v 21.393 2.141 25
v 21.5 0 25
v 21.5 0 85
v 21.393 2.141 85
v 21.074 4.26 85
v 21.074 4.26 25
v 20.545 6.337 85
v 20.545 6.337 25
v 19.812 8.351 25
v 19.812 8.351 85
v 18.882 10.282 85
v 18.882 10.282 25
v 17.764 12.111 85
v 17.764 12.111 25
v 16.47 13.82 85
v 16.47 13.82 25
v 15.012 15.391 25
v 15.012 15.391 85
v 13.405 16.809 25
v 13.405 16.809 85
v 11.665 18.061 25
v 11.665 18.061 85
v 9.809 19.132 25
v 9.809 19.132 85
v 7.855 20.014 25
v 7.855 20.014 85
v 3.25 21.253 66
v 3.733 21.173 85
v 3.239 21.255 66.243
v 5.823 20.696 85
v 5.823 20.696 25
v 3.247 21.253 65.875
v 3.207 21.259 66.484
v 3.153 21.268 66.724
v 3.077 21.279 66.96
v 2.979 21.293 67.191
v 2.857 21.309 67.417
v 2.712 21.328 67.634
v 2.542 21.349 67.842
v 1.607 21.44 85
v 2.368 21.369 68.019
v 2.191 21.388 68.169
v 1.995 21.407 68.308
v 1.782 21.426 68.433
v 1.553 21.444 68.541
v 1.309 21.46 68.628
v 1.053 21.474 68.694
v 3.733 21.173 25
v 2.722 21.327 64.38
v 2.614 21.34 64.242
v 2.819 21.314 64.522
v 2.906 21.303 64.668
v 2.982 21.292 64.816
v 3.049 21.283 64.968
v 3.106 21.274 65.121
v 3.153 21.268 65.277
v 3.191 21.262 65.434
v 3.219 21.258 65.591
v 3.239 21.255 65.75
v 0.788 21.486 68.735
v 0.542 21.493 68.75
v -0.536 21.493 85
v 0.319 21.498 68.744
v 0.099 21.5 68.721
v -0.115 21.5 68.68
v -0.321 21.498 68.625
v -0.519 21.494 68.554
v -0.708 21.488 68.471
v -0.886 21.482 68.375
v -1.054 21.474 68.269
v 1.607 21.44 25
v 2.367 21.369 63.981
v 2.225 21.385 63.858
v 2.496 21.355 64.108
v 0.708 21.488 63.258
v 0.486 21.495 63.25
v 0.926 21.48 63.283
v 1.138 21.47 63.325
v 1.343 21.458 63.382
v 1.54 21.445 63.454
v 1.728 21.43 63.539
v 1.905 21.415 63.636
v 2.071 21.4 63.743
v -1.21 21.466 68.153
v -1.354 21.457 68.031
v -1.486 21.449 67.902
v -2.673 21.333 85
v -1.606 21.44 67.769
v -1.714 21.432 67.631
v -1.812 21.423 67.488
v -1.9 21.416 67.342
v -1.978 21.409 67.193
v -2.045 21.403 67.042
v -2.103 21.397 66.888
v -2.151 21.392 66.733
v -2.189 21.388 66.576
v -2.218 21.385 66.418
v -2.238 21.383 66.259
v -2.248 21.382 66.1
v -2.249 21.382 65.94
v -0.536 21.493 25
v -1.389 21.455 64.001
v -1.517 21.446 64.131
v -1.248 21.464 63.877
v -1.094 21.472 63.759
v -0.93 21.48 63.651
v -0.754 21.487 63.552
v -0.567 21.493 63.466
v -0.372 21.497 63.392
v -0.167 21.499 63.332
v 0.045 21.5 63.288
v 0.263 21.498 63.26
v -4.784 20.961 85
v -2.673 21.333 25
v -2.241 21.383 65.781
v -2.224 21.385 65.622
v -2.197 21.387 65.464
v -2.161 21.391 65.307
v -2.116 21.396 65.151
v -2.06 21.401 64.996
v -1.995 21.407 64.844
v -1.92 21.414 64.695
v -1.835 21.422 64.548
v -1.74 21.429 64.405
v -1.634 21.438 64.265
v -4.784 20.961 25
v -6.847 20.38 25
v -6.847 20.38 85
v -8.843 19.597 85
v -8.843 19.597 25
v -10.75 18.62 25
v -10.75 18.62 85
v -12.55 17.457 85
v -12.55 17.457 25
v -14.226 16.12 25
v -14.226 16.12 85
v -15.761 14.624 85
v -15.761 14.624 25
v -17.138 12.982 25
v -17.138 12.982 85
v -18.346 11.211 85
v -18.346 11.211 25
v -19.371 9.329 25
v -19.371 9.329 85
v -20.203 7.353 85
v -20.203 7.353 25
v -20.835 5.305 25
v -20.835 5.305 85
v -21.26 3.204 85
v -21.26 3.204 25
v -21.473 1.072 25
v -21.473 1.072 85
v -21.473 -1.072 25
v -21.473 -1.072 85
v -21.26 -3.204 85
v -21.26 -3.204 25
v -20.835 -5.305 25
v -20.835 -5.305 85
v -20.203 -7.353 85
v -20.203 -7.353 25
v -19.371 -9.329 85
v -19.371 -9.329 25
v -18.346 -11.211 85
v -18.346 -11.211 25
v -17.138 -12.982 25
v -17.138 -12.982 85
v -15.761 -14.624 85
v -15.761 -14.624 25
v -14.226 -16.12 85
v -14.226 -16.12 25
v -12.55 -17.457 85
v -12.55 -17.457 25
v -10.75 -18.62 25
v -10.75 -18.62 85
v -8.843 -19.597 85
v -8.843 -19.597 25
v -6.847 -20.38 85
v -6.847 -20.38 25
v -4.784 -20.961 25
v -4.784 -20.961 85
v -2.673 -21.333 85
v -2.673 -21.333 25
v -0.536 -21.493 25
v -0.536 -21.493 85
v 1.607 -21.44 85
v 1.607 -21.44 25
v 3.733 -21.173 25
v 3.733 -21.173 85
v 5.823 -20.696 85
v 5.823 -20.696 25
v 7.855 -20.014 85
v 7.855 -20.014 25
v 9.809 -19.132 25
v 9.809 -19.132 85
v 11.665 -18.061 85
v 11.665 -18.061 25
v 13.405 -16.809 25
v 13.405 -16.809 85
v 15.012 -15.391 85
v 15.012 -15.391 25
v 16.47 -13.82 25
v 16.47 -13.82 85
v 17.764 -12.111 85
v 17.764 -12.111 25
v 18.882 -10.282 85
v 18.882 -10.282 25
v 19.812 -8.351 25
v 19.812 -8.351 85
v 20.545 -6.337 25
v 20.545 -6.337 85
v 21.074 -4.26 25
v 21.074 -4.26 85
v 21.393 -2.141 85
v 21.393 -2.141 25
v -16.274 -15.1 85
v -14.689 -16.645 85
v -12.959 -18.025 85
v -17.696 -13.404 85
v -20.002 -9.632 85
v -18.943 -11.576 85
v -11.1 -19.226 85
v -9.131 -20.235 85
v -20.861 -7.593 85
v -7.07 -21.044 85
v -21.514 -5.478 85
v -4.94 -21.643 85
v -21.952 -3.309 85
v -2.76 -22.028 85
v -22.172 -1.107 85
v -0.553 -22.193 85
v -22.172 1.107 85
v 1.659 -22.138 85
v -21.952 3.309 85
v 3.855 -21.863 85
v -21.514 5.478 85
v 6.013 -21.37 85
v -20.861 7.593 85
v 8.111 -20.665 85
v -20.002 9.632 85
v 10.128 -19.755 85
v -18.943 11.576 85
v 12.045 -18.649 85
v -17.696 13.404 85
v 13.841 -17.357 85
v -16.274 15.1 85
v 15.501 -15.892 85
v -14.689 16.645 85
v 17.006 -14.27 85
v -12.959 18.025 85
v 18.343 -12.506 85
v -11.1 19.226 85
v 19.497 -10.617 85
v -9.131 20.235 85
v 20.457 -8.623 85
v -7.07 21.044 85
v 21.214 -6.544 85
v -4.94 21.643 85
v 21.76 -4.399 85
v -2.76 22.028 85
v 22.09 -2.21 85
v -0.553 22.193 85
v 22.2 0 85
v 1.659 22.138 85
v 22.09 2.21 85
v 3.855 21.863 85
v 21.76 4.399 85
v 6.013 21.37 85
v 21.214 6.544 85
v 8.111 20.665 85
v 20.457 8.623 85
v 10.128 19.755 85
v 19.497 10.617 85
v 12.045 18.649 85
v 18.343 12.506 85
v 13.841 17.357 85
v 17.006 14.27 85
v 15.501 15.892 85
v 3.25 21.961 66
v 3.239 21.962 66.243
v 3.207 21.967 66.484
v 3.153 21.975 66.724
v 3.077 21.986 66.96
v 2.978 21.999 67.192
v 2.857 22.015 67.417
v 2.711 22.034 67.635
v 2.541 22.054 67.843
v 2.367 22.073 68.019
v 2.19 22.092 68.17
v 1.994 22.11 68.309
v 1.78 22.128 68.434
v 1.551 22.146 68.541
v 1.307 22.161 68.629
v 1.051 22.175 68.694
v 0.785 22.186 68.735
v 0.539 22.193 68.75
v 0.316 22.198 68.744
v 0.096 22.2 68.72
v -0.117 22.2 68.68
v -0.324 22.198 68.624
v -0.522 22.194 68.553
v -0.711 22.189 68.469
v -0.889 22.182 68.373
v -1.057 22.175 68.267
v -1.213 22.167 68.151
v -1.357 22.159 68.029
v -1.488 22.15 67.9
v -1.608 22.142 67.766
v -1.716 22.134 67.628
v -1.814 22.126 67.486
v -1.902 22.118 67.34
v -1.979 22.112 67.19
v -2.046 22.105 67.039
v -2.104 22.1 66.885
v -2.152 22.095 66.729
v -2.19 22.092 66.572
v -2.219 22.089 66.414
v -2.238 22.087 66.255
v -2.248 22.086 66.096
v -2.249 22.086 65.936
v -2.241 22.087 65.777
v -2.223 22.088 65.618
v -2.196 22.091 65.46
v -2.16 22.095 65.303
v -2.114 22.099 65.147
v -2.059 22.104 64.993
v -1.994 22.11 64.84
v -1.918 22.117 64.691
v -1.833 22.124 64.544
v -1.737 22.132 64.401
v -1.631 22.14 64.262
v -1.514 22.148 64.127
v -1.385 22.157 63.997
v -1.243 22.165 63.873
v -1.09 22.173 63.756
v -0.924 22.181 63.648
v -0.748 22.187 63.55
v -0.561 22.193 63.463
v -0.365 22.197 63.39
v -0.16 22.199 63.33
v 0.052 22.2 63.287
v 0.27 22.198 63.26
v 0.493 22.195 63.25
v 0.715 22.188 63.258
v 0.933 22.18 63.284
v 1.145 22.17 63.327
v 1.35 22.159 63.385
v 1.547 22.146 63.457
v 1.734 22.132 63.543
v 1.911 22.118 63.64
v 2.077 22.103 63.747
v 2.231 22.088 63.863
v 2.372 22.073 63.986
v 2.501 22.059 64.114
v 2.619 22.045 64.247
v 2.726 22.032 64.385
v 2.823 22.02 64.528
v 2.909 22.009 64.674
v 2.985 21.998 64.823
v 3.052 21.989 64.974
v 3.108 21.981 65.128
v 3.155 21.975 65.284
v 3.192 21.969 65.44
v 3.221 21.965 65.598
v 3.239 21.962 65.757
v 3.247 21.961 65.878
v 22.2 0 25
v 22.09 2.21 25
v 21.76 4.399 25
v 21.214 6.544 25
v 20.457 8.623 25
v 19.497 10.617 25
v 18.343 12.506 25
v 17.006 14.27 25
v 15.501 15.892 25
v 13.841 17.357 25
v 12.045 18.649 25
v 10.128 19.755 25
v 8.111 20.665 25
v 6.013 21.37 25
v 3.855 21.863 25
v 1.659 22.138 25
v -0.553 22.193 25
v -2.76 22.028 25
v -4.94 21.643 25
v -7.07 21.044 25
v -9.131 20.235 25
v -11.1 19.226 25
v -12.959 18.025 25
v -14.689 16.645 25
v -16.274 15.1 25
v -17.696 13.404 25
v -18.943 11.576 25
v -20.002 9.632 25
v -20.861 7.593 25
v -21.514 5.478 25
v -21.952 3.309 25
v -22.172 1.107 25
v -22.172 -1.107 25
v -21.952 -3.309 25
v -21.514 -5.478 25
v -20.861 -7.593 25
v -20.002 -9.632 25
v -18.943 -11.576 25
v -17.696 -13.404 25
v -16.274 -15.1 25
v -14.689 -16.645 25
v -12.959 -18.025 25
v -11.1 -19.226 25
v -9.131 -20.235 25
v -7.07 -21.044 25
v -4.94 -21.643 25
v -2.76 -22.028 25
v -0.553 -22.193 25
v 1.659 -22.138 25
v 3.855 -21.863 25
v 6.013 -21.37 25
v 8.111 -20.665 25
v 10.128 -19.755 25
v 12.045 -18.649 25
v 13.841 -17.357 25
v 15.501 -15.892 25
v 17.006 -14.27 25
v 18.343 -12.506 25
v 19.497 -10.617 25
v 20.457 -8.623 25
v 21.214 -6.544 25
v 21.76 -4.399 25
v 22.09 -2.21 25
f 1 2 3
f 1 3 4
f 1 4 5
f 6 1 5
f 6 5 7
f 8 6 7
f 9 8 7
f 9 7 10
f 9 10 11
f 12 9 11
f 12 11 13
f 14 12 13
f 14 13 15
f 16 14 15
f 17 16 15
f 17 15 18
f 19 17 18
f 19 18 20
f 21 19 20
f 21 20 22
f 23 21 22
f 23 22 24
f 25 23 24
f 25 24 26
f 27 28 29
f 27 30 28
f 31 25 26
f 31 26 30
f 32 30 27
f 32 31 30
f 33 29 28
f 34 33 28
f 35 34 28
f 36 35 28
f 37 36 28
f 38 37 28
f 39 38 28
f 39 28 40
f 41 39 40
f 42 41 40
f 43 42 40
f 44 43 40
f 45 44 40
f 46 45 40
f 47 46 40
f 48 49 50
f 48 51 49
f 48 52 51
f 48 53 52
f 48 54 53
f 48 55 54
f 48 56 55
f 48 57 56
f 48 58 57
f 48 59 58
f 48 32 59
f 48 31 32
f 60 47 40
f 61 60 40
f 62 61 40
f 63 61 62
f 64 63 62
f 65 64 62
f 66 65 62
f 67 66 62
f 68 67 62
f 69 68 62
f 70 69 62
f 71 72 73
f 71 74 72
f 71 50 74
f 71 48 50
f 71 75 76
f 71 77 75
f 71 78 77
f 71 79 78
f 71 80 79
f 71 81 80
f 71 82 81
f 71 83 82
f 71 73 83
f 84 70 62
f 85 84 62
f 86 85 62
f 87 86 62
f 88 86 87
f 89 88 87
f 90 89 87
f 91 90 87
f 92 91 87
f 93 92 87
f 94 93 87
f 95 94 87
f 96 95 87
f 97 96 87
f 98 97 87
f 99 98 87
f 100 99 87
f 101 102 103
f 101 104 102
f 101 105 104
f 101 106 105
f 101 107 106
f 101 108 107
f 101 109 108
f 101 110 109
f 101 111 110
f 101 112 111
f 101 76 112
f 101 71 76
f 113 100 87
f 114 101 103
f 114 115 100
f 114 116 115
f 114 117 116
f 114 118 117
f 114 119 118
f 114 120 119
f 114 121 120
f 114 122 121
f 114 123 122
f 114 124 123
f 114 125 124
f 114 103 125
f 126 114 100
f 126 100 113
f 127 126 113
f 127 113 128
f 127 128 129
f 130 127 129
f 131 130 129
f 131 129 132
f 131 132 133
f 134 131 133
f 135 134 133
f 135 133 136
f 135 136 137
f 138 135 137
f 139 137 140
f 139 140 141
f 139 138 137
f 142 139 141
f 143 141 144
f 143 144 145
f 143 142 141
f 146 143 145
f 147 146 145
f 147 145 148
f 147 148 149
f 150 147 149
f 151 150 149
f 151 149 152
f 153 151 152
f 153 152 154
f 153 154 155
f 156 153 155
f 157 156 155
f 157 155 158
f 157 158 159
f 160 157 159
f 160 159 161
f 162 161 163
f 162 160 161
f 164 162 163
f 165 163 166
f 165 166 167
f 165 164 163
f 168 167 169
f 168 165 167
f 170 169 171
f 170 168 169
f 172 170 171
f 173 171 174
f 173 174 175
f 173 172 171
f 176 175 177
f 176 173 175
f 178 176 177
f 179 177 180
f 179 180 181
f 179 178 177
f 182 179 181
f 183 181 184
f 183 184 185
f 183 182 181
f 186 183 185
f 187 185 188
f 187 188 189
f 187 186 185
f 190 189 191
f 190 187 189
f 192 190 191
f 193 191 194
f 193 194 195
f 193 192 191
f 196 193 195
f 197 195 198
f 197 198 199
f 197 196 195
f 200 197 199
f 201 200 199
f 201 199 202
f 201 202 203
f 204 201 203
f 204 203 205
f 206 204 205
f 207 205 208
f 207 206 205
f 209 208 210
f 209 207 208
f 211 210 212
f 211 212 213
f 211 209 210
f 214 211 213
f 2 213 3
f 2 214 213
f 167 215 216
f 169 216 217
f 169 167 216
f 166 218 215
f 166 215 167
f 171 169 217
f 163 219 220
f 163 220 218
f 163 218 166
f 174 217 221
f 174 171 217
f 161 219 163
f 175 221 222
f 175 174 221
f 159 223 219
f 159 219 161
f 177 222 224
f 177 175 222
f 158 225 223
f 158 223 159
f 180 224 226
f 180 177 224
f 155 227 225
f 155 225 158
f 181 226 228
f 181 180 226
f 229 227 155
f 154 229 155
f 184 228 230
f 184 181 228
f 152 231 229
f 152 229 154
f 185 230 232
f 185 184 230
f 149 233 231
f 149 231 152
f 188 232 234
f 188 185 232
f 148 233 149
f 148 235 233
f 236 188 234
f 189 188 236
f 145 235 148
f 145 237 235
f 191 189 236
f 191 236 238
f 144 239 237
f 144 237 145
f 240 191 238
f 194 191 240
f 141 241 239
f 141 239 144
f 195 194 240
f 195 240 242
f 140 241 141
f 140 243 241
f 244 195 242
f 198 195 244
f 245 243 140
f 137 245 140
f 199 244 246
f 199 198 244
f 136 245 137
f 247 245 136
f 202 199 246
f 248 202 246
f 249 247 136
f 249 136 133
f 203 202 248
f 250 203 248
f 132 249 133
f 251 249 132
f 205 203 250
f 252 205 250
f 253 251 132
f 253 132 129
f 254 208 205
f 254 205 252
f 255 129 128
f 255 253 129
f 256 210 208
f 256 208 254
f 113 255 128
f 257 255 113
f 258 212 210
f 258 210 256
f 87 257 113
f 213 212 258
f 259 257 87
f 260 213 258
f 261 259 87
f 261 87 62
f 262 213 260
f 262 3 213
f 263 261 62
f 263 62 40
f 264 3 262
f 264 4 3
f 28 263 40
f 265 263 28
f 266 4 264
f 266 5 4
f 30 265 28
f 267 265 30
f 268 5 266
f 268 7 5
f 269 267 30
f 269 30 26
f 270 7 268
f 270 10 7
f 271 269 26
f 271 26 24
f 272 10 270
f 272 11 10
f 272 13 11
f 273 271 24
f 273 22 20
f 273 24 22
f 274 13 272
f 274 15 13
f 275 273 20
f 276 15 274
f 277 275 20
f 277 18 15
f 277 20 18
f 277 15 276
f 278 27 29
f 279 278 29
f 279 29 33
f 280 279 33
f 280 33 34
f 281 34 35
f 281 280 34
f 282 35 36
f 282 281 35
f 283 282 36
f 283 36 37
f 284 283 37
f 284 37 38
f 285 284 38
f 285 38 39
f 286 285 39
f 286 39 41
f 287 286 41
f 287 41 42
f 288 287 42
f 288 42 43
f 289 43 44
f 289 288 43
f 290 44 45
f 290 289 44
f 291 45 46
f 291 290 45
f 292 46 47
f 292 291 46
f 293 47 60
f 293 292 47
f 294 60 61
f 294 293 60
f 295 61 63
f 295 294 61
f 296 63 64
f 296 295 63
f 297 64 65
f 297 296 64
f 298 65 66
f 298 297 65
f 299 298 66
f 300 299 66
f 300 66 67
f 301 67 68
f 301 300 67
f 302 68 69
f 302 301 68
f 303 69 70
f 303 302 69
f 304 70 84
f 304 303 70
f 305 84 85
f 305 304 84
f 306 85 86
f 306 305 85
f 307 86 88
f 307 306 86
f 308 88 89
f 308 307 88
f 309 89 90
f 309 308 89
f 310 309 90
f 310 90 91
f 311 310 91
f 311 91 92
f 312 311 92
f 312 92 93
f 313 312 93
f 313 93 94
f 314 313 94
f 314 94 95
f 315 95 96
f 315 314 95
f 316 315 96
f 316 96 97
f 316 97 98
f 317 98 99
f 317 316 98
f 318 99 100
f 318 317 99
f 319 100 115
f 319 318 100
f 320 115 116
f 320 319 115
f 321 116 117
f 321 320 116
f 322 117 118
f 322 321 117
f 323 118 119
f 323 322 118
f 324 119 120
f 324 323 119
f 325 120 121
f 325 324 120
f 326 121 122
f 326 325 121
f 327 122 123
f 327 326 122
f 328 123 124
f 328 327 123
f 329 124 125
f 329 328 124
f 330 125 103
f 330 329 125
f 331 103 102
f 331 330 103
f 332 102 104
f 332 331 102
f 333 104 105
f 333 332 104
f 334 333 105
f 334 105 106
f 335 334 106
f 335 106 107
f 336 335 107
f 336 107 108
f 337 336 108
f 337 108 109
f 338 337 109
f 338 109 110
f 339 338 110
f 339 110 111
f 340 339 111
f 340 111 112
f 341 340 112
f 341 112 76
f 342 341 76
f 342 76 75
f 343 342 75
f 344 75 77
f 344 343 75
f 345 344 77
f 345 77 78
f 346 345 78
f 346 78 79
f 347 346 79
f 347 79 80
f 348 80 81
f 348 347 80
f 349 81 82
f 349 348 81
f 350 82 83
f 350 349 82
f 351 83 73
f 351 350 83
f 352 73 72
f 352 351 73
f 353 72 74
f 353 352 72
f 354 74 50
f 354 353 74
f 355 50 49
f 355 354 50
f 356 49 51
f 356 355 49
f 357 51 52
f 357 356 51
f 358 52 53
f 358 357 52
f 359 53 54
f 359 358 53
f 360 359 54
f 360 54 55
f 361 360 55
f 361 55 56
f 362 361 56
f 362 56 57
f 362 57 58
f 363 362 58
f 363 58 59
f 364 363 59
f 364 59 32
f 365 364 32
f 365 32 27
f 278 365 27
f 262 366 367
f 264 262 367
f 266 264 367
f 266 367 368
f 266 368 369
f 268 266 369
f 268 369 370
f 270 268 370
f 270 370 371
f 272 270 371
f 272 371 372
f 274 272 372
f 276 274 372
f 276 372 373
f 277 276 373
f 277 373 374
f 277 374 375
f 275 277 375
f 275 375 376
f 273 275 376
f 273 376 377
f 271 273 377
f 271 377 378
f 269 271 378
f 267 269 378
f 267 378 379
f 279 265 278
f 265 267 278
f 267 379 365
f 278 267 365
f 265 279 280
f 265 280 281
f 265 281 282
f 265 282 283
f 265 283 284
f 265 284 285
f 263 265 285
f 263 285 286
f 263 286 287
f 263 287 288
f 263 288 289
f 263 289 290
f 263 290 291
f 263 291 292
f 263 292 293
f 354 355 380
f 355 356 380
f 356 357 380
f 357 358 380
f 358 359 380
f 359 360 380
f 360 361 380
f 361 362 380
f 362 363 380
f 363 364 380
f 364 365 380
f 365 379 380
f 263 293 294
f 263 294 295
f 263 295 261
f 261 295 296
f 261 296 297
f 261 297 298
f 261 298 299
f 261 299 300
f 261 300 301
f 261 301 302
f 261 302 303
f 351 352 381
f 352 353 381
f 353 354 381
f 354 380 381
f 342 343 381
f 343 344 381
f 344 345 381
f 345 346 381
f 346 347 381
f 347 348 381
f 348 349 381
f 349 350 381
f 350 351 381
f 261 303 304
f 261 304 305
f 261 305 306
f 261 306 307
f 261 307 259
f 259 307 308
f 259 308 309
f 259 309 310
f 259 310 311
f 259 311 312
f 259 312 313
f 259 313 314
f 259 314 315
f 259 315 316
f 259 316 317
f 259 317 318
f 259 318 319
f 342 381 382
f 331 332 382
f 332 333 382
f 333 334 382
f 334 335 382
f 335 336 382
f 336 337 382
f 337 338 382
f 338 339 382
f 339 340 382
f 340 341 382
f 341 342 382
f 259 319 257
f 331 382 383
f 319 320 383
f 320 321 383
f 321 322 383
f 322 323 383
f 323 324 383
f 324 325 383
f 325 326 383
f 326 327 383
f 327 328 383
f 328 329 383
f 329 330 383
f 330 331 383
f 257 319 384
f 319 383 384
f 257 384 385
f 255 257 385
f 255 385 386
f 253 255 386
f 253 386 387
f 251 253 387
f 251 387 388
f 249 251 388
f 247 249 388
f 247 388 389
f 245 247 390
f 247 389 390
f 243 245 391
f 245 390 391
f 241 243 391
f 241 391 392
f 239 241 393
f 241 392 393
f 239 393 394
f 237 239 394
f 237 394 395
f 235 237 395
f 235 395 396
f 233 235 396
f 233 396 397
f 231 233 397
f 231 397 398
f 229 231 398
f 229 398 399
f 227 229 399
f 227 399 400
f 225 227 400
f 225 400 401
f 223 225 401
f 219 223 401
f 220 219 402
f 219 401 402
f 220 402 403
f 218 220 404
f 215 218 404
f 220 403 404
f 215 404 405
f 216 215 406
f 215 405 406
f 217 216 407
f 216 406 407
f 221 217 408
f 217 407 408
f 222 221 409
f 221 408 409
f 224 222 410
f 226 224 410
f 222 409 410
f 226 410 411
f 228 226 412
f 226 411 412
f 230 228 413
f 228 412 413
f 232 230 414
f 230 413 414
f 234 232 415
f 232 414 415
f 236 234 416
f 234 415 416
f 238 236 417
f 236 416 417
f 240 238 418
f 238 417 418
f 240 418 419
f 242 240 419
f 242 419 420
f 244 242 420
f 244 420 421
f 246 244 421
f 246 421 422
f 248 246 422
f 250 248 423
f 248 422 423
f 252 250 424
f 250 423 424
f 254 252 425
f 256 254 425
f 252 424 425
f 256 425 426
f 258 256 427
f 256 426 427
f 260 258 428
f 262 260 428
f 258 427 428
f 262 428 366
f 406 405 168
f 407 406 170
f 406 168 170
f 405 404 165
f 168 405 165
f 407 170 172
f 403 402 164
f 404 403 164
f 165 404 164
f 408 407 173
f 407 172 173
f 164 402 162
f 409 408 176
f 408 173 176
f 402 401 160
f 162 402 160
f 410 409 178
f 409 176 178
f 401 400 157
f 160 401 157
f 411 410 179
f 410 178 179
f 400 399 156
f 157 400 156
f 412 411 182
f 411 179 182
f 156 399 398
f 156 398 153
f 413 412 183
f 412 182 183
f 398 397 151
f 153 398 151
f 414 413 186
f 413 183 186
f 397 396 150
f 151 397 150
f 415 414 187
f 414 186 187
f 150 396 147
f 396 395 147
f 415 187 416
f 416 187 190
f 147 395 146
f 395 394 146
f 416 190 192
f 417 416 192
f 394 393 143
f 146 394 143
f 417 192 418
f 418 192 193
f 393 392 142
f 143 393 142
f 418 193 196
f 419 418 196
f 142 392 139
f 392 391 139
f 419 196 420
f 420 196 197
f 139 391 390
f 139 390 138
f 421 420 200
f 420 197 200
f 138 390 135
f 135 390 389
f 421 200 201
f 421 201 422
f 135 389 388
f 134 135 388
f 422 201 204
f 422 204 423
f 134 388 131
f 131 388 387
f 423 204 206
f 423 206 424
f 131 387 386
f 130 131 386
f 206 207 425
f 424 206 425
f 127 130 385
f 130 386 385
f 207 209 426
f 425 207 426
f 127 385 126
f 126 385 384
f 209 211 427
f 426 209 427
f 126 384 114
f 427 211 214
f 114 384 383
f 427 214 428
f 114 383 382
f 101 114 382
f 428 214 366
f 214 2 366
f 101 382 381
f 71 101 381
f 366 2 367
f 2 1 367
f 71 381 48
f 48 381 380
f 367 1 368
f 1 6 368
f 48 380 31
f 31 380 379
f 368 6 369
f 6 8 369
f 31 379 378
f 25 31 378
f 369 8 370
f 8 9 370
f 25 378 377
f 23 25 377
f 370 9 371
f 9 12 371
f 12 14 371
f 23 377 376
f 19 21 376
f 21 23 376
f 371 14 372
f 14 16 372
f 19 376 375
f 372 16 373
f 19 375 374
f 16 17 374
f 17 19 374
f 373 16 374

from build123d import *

# Parameters (mm, degrees)
CYLINDER005_R     = 2.75
CYLINDER005_DEPTH = 10
CYLINDER004_R     = 21.5
CYLINDER004_DEPTH = 60
CYLINDER003_R     = 22.2
CYLINDER003_DEPTH = 60


with BuildPart() as cylinder005:
    # Cylinder005 → Cylinder005 (new body)
    with BuildSketch(Plane(origin=(0.5, 26, 66), x_dir=(1, 0, 0), z_dir=(0, -1, 0))):
        Circle(CYLINDER005_R)
    extrude(amount=CYLINDER005_DEPTH)


with BuildPart() as cylinder004:
    # Cylinder004 → Cylinder004 (new body)
    with BuildSketch(Plane.XY):
        Circle(CYLINDER004_R)
    extrude(amount=CYLINDER004_DEPTH)


with BuildPart() as cylindrical_section:
    # Cylinder003 → Cylinder003 (new body)
    with BuildSketch(Plane.XY):
        Circle(CYLINDER003_R)
    extrude(amount=CYLINDER003_DEPTH)

    # Cut002: cut Cylinder004
    add(cylinder004.part, mode=Mode.SUBTRACT)


with BuildPart() as cylindrical_section_1:
    # Cut002 placement: moved
    add(cylindrical_section.part.moved(Location((0, 0, 25))))

    # Cut004: cut Cylinder005
    add(cylinder005.part, mode=Mode.SUBTRACT)


solid = cylindrical_section_1.part
